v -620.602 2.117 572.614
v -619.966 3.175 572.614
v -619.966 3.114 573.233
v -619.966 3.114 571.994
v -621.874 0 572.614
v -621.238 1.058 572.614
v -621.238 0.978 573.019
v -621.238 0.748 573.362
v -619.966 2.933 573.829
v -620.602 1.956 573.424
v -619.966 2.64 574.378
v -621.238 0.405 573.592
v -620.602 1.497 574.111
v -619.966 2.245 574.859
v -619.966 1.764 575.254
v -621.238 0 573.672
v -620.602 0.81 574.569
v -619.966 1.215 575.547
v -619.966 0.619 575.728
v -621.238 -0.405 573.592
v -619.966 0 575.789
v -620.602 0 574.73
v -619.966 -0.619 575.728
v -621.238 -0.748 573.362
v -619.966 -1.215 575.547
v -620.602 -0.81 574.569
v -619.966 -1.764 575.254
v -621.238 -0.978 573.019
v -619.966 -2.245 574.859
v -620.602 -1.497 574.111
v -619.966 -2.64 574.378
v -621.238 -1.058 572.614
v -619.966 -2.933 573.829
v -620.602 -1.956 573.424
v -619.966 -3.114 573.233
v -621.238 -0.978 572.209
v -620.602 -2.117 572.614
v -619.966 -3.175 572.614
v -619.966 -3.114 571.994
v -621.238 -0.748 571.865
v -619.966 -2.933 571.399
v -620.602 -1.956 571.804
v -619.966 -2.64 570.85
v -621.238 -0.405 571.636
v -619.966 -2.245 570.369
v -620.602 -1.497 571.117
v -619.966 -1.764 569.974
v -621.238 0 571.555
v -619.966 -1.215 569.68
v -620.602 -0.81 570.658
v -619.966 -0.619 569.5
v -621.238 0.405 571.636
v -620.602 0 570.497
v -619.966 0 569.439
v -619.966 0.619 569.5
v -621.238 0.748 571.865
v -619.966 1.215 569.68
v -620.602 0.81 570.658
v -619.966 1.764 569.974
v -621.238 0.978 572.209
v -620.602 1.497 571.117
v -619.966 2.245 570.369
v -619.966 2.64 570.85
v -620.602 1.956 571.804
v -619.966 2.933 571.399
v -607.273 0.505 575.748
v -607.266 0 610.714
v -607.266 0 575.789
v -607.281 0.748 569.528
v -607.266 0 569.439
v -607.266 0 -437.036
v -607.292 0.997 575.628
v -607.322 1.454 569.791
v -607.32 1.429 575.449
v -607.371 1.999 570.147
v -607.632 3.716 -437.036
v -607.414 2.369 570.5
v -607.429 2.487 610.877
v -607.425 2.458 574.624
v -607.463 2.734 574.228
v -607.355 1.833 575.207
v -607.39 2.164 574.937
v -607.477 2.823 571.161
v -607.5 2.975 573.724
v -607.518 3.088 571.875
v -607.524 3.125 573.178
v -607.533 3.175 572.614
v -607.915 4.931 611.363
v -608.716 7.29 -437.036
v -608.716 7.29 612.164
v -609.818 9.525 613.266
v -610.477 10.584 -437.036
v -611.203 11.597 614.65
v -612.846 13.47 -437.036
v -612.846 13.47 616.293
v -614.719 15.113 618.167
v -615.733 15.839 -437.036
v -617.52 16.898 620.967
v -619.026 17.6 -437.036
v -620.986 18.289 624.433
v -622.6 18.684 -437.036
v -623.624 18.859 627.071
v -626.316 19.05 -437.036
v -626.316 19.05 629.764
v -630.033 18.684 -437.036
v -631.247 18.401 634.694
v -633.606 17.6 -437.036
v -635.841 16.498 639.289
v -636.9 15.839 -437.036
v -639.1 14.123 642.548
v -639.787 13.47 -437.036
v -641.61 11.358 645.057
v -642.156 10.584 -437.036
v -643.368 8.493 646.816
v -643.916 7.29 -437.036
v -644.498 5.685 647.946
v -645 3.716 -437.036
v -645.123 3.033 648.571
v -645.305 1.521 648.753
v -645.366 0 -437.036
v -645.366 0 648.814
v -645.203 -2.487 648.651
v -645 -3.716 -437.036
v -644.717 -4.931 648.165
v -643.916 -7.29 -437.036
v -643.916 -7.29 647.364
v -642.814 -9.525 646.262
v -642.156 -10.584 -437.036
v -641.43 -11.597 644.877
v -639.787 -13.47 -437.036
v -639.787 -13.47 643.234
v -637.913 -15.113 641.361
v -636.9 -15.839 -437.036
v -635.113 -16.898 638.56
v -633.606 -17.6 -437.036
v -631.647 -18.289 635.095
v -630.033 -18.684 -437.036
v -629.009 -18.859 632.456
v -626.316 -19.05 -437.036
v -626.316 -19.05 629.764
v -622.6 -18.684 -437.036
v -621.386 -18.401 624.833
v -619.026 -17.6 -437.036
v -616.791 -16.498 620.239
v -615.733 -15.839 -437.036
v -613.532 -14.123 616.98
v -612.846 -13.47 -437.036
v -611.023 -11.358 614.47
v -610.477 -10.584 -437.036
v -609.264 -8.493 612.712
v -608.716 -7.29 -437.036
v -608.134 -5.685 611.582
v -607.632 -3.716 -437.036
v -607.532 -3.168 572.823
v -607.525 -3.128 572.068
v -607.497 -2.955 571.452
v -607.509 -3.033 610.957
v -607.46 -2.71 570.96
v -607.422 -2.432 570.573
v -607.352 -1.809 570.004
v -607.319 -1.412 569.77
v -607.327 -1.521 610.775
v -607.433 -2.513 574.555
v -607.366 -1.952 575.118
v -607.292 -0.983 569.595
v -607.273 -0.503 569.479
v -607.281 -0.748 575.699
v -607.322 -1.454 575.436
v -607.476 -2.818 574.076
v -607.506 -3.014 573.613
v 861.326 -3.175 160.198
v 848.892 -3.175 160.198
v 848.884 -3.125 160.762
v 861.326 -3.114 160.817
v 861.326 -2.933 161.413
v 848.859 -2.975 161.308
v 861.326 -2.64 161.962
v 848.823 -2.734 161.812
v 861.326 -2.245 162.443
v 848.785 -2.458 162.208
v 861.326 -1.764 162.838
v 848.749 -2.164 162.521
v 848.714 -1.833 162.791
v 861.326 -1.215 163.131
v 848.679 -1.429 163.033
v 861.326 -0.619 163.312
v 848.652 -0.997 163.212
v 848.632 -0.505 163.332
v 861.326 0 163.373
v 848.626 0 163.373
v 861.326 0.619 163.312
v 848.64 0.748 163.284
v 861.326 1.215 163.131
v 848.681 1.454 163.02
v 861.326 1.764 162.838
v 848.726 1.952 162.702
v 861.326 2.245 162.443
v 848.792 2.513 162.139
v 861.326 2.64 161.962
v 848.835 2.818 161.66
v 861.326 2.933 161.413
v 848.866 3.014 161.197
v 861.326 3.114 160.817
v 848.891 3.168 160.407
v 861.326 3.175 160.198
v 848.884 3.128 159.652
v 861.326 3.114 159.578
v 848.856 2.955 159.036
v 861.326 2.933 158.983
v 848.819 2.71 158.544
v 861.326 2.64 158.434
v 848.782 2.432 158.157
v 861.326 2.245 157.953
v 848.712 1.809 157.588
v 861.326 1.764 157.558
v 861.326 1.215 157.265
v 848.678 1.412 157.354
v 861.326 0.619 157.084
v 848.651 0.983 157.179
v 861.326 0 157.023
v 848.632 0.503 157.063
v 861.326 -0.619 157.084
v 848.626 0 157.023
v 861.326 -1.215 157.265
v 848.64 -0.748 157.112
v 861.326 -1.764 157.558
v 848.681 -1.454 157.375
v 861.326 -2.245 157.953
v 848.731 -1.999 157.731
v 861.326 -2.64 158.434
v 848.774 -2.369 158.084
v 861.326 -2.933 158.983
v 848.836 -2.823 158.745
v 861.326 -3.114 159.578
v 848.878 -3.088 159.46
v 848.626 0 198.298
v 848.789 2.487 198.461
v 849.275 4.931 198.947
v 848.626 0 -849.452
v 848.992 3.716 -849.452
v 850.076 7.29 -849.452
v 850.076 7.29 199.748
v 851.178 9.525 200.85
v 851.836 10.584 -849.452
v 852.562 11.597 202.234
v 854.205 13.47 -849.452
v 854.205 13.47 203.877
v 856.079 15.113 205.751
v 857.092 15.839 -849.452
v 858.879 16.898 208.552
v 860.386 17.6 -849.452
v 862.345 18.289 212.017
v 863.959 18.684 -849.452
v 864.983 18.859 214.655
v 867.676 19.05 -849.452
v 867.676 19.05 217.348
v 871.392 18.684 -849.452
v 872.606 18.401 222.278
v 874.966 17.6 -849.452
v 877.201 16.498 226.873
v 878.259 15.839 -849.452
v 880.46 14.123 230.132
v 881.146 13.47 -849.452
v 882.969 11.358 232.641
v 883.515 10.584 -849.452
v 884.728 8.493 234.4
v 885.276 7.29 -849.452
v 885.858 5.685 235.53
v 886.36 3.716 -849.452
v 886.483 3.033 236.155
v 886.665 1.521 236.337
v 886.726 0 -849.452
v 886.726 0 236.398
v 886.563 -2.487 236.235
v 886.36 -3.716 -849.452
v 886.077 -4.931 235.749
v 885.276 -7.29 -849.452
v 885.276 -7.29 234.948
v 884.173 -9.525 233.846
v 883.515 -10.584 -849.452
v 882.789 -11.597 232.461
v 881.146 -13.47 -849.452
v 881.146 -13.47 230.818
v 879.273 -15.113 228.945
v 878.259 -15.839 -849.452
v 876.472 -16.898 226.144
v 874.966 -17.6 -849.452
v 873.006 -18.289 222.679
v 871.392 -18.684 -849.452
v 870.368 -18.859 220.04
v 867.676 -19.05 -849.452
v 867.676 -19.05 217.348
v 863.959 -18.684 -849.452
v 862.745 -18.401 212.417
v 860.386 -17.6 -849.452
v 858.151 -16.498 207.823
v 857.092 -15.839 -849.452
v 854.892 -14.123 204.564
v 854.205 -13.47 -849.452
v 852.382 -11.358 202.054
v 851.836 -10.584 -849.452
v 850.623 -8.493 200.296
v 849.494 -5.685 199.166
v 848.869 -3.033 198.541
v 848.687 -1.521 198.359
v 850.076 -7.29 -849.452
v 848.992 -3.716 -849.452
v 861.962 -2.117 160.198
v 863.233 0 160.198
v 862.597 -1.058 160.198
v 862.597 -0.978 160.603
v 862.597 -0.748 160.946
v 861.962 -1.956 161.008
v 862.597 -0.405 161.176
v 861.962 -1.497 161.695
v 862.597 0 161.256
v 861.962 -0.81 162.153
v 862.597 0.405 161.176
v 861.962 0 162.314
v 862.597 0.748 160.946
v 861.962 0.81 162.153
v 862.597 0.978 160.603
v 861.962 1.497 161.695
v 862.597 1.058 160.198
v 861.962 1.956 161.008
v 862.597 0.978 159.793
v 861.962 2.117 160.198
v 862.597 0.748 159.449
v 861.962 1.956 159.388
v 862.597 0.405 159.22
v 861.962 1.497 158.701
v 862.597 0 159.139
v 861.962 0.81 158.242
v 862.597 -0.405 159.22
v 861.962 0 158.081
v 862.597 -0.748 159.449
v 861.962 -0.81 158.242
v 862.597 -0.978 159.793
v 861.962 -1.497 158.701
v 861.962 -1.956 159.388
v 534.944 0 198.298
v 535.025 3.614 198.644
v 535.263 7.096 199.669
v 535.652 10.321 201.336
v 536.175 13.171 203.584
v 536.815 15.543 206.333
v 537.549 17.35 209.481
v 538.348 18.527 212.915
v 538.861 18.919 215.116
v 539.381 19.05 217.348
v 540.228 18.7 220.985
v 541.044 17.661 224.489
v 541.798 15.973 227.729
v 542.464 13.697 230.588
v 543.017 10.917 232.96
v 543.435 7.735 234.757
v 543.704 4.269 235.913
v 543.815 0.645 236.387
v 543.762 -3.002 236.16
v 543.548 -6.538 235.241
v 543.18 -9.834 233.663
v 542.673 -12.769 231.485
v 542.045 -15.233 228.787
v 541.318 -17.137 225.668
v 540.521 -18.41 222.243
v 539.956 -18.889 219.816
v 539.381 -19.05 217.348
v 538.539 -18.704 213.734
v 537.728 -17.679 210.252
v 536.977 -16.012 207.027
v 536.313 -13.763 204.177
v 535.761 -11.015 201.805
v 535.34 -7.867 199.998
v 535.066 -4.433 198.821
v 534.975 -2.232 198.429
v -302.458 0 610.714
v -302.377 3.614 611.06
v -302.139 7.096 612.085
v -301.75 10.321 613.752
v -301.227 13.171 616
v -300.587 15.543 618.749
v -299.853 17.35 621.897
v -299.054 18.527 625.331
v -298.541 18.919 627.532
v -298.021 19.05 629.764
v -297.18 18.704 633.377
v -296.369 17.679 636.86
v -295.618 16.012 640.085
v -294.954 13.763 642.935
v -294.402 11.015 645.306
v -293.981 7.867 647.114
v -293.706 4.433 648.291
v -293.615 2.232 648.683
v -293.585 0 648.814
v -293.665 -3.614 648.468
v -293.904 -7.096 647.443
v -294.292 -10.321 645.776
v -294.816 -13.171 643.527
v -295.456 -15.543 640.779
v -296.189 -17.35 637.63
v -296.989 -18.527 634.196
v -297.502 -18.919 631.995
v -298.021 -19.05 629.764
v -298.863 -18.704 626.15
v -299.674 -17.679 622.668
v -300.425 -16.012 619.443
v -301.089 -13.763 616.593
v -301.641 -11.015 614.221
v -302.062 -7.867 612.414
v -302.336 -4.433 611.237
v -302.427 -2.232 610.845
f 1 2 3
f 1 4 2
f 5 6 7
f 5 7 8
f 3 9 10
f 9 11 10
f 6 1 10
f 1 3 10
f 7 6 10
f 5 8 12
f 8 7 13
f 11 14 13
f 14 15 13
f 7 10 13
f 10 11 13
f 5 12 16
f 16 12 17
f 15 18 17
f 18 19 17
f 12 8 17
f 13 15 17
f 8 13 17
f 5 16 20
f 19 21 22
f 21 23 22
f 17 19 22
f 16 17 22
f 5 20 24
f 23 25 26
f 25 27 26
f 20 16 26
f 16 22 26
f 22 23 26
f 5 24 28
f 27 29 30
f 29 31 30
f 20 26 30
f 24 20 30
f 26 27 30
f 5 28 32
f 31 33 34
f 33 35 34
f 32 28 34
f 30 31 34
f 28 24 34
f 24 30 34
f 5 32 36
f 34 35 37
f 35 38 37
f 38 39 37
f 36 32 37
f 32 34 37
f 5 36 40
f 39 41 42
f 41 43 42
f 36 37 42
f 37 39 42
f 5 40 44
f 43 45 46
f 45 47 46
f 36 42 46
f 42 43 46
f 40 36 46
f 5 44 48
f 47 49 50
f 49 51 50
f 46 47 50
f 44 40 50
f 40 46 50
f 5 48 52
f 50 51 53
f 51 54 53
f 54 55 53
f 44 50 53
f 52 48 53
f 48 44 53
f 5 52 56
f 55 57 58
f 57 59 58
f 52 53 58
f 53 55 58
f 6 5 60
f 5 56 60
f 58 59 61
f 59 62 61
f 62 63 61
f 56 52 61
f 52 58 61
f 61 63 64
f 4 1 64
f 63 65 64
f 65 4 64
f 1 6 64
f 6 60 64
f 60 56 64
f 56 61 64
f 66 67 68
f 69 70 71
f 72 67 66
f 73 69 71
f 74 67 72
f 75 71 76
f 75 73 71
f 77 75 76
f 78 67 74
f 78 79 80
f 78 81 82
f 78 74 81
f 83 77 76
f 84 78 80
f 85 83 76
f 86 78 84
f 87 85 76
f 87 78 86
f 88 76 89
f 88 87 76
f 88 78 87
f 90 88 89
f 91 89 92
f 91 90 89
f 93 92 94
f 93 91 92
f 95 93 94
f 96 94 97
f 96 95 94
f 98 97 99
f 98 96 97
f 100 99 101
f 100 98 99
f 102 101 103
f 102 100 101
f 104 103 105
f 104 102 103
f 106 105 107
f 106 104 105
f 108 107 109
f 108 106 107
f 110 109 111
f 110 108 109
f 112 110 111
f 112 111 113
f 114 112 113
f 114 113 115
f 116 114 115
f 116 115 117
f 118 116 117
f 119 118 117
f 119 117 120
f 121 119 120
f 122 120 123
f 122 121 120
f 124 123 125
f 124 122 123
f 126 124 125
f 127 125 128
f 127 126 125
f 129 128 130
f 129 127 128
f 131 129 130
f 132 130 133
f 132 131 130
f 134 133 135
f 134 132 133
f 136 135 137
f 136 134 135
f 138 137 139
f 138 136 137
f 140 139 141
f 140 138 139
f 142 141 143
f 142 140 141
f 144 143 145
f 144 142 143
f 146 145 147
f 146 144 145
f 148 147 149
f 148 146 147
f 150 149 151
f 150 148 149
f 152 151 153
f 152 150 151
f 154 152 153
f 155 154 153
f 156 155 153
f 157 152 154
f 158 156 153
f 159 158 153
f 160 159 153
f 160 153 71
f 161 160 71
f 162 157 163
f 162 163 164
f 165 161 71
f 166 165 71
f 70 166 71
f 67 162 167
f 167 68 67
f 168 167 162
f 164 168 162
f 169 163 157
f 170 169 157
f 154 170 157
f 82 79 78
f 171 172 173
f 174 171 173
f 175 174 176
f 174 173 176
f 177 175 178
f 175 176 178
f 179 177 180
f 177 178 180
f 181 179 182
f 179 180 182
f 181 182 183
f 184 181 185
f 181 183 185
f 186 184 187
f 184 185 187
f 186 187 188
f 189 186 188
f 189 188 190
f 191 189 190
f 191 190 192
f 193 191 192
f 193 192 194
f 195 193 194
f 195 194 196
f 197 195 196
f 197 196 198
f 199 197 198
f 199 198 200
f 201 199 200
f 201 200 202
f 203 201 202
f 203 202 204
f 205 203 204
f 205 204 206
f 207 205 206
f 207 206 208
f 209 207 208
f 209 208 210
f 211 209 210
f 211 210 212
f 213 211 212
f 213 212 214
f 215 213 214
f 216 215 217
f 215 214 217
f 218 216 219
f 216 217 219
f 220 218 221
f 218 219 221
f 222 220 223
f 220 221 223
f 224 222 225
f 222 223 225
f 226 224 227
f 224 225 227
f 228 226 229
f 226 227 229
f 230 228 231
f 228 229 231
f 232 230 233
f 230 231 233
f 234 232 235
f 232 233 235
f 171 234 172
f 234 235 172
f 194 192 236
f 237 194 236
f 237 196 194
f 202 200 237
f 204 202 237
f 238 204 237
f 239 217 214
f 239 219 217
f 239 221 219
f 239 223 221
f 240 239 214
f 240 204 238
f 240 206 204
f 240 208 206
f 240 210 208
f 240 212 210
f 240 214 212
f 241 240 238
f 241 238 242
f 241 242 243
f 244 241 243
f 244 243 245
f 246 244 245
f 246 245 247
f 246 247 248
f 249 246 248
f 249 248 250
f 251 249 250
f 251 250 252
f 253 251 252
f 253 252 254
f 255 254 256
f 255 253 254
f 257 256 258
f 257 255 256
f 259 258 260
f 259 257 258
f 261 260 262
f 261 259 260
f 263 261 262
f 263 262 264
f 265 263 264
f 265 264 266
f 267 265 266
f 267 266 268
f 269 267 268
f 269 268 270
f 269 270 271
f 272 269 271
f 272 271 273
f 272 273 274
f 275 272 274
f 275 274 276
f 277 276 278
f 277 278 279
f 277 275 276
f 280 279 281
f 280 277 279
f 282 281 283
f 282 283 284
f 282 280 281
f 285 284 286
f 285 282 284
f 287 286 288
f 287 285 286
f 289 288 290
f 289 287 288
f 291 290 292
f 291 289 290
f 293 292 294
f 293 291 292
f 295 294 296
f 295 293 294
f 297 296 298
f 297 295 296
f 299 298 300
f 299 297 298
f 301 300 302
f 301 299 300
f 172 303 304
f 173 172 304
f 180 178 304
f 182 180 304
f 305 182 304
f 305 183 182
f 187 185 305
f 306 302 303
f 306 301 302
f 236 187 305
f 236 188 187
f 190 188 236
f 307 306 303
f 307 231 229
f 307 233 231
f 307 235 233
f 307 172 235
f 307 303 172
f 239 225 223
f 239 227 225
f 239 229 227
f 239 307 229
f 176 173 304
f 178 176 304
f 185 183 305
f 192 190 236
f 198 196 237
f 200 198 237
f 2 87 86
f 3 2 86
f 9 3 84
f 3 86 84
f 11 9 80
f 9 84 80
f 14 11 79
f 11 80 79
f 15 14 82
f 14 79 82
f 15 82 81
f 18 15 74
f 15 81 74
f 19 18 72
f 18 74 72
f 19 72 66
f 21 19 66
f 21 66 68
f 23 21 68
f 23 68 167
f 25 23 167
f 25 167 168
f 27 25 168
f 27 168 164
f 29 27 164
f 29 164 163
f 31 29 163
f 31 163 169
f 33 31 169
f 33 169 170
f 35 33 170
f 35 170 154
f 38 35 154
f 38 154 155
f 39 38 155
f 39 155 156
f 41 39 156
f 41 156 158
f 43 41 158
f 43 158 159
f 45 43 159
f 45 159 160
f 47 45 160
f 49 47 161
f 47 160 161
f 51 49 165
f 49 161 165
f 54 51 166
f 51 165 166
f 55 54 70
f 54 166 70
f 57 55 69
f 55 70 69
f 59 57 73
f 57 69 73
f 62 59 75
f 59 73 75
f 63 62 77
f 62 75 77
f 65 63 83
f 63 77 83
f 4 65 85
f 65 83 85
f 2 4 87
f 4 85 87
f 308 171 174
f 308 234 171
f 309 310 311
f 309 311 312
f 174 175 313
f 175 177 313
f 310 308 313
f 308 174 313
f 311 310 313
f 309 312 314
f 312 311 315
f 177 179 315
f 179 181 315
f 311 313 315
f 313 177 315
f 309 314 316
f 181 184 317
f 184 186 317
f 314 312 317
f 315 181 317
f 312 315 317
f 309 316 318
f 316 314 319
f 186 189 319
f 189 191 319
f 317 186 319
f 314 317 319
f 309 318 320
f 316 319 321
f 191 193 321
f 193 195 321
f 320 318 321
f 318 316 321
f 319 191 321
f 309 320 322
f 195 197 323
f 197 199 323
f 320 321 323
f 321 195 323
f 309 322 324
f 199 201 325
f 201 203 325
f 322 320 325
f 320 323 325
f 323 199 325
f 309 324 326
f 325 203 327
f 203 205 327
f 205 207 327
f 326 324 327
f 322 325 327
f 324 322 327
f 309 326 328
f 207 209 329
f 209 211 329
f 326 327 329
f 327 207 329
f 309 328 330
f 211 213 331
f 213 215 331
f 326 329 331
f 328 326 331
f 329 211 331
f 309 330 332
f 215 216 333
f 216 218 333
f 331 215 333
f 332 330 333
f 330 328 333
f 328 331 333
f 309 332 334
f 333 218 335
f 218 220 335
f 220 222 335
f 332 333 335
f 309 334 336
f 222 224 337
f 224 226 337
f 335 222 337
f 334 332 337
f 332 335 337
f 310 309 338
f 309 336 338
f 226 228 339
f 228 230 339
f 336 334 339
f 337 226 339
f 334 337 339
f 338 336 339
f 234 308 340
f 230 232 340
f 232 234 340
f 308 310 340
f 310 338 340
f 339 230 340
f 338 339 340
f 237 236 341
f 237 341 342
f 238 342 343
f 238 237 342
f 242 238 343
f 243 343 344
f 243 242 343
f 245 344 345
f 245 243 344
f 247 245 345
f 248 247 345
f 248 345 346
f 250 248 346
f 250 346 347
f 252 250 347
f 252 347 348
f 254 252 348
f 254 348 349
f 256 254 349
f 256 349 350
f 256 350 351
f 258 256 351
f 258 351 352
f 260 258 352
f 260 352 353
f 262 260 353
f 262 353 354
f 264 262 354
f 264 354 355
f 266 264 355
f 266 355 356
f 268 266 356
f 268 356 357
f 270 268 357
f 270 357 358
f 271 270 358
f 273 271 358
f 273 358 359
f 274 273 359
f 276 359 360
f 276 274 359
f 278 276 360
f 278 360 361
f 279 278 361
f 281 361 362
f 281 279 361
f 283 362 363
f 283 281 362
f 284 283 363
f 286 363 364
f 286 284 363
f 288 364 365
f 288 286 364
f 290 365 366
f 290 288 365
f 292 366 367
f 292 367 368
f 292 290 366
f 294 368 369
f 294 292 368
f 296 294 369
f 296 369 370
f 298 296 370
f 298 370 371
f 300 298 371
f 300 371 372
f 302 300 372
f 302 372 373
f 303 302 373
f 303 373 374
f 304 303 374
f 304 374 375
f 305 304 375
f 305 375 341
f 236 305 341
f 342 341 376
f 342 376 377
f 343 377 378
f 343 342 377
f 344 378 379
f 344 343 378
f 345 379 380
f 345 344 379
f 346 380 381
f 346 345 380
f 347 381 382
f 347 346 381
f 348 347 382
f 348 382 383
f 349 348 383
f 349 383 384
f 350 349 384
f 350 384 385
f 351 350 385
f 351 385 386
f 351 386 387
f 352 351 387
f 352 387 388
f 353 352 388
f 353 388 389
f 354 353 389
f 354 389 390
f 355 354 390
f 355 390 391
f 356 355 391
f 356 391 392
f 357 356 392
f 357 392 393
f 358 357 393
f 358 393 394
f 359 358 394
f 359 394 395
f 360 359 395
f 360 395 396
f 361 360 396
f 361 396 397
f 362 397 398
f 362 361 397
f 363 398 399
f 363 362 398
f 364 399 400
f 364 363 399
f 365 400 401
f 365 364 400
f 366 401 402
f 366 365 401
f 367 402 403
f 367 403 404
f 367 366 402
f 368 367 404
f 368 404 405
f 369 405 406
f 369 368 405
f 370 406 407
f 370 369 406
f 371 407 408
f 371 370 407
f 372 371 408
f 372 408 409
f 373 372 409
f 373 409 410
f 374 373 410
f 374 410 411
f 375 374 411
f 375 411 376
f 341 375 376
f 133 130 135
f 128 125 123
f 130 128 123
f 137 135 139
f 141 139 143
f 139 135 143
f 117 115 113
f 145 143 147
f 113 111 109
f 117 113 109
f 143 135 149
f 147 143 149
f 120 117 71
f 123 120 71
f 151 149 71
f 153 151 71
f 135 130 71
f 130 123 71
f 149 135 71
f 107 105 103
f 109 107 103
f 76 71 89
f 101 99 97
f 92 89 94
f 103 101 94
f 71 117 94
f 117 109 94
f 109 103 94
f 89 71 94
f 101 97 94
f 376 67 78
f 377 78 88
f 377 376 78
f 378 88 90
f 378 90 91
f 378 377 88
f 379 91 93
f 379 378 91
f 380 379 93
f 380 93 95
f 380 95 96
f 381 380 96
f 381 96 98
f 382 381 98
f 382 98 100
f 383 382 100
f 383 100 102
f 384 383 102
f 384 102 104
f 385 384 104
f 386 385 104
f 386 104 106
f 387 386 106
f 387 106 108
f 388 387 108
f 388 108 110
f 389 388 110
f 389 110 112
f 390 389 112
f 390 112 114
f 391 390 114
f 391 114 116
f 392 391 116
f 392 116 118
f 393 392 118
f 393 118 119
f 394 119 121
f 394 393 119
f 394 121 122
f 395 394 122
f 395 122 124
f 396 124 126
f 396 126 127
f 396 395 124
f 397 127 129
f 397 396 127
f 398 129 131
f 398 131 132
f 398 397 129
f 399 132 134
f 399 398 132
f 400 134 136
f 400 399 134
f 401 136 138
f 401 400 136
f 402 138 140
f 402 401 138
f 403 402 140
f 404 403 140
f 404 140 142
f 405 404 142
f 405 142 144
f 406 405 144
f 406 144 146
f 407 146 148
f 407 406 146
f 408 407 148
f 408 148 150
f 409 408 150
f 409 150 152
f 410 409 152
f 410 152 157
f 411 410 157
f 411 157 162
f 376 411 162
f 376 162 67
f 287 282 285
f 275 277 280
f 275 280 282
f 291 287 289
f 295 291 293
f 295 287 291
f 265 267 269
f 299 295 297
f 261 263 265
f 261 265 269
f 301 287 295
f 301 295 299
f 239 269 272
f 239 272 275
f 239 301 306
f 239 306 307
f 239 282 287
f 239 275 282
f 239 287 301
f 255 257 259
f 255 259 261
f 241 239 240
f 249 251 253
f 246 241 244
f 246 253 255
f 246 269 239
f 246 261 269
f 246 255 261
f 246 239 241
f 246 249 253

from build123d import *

# Parameters (mm, degrees)
F2_R      = 19.05
F9_D      = 6.35
F9_DEPTH  = 12.7
F9_TIP    = 1.9077324654
F15_D     = 6.35
F15_DEPTH = 12.7
F15_TIP   = 1.9077324654


with BuildPart() as f3:
    # F3: sweep along a path in F0
    with BuildLine(Plane.XZ) as f3_path:
        Line((-626.3162476942, -437.036204844), (-626.3162476942, 629.763795156))
        Line((-626.3162476942, 629.763795156), (-298.0212476942, 629.763795156))
        Line((-298.0212476942, 629.763795156), (539.3806681667, 217.3478233358))
        Line((539.3806681667, 217.3478233358), (867.6756681667, 217.3478233358))
        Line((867.6756681667, 217.3478233358), (867.6756681667, -849.4521766642))
    # F2 (on plane+point) → F3 (sweep)
    with BuildSketch(Plane.XY.offset(-437.036204844)):
        with Locations((-626.3162476942, 0)):
            Circle(F2_R)
    sweep(path=f3_path.line, transition=Transition.RIGHT)

    # F9 (one way)
    with BuildSketch(Plane.YZ.offset(-607.2662476942)):
        with Locations((0, 572.613795156)):
            Circle(F9_D / 2)
    extrude(amount=-F9_DEPTH, mode=Mode.SUBTRACT)
    with Locations(Plane.YZ.offset(-607.2662476942)):
        with Locations((0, 572.613795156)):
            with Locations((0, 0, -(F9_DEPTH + F9_TIP / 2))):  # 118° drill point
                Cone(0, F9_D / 2, F9_TIP, mode=Mode.SUBTRACT)

    # F15 (one way)
    with BuildSketch(Plane(origin=(848.6256681667, 0, 0), x_dir=(0, -1, 0), z_dir=(-1, 0, 0))):
        with Locations((0, 160.1978233358)):
            Circle(F15_D / 2)
    extrude(amount=-F15_DEPTH, mode=Mode.SUBTRACT)
    with Locations(Plane(origin=(848.6256681667, 0, 0), x_dir=(0, -1, 0), z_dir=(-1, 0, 0))):
        with Locations((0, 160.1978233358)):
            with Locations((0, 0, -(F15_DEPTH + F15_TIP / 2))):  # 118° drill point
                Cone(0, F15_D / 2, F15_TIP, mode=Mode.SUBTRACT)


solid = f3.part
